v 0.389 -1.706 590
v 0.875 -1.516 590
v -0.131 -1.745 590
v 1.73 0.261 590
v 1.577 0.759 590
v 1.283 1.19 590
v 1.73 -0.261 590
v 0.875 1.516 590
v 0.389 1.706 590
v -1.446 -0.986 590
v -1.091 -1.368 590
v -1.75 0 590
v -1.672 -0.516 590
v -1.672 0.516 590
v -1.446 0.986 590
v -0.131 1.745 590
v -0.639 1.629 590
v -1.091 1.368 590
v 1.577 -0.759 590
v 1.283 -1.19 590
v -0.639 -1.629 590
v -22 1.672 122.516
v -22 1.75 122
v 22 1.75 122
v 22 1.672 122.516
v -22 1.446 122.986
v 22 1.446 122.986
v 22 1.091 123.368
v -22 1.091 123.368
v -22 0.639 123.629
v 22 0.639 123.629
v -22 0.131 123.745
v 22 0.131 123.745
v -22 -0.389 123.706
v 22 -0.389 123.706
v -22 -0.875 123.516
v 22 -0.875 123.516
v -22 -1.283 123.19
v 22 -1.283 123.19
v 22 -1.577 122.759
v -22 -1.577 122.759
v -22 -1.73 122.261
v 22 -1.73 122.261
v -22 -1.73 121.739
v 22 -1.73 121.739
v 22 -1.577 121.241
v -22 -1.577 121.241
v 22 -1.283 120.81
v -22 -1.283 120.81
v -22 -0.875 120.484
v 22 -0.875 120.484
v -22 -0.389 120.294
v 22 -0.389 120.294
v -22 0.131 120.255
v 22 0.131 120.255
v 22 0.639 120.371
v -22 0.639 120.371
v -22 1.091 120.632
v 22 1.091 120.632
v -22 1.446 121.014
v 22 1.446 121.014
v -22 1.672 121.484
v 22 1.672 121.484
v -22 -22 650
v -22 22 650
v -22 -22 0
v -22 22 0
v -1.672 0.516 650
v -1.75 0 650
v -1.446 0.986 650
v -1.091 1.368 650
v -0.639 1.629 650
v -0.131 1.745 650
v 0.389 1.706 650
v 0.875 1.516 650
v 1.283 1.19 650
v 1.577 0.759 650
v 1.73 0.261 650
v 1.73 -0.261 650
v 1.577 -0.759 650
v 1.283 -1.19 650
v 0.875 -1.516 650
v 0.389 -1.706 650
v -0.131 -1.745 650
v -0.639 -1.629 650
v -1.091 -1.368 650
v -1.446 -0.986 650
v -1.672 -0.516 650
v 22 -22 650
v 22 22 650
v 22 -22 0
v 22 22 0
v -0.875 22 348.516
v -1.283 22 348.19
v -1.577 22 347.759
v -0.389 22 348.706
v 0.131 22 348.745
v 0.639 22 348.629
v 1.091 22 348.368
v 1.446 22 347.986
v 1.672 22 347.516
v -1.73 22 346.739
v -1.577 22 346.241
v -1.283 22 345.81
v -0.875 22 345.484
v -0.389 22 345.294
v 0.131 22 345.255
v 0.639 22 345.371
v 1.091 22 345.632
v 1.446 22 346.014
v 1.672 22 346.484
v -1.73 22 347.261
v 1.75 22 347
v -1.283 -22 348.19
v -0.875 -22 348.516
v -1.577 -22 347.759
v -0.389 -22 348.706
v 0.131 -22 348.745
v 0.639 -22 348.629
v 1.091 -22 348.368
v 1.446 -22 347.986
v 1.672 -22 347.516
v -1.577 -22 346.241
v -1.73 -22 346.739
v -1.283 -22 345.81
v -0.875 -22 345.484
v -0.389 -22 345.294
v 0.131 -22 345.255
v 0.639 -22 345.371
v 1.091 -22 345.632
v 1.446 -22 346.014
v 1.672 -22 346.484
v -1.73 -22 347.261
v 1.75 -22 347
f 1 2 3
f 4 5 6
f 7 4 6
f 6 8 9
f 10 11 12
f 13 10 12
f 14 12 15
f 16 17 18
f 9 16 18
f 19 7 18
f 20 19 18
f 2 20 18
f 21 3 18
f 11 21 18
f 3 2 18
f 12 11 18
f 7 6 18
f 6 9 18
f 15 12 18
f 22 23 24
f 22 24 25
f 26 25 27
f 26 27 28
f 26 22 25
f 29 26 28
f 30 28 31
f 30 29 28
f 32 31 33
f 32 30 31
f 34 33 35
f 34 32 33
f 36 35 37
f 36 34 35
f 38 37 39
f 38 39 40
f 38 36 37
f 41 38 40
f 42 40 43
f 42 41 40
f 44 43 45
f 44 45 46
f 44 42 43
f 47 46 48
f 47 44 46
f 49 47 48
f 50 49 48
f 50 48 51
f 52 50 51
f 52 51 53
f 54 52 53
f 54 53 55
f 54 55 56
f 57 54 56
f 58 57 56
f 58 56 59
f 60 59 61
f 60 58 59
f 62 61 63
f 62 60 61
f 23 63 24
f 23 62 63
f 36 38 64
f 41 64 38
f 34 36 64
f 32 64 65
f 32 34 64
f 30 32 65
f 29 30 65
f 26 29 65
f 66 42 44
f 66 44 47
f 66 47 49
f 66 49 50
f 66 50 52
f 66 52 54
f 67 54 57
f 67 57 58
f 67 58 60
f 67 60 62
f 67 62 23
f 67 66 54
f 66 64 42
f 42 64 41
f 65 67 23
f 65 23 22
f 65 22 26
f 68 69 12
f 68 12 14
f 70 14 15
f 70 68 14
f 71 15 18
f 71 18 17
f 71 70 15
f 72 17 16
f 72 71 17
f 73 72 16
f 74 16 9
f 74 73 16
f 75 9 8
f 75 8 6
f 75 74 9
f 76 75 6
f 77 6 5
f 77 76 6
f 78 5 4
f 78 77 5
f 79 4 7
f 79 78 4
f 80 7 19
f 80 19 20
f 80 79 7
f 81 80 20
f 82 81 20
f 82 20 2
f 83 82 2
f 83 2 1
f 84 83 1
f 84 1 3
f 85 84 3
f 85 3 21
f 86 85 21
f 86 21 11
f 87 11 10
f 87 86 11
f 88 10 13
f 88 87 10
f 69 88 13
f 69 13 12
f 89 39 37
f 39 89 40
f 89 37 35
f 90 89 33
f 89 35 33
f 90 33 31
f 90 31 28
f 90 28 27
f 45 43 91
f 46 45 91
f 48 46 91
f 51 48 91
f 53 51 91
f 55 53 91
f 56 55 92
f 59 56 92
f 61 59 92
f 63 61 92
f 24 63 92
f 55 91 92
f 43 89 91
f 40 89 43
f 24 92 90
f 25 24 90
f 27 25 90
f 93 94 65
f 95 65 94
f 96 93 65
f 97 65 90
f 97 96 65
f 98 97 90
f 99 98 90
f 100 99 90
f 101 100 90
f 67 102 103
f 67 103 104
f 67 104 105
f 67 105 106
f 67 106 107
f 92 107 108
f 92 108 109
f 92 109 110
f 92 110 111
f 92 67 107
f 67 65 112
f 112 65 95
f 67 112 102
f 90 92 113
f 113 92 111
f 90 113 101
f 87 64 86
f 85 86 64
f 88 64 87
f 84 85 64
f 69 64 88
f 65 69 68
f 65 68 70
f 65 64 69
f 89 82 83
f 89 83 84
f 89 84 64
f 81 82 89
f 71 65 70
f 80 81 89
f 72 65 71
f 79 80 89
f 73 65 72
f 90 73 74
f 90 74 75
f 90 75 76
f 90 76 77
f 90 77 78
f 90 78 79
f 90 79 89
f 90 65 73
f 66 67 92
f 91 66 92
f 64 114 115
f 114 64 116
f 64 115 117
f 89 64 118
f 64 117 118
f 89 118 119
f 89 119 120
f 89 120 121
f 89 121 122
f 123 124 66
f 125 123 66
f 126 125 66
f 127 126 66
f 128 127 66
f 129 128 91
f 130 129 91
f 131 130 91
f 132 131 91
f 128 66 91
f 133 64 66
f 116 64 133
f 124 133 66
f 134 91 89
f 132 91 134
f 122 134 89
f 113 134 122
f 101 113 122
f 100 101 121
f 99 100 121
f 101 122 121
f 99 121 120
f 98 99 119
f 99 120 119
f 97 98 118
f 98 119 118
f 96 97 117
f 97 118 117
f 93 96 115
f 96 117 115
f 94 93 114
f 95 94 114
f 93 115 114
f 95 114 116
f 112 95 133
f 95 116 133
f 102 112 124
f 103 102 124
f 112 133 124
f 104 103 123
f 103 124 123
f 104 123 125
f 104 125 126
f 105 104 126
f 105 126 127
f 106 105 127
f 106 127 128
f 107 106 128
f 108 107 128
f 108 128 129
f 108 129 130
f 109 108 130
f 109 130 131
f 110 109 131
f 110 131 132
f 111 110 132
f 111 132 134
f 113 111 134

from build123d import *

# Parameters (mm, degrees)
ESQUISSE1_W             = 44
ESQUISSE1_H             = 44
BOSS_EXTRU_1_DEPTH      = 650
ESQUISSE2_R             = 1.75
ENL_V_MAT_EXTRU_1_DEPTH = 60
ESQUISSE3_R             = 1.75
ENL_V_MAT_EXTRU_2_DEPTH = 44
ESQUISSE4_R             = 1.75
ENL_V_MAT_EXTRU_3_DEPTH = 60


with BuildPart() as part:
    # Esquisse1 → Boss.-Extru.1 (new body)
    with BuildSketch(Plane.XY):
        Rectangle(ESQUISSE1_W, ESQUISSE1_H)
    extrude(amount=BOSS_EXTRU_1_DEPTH)

    # Esquisse2 → Enlèv. mat.-Extru.1 (cut)
    with BuildSketch(Plane(origin=(0, 0, 650), x_dir=(-1, 0, 0), z_dir=(0, 0, -1))):
        Circle(ESQUISSE2_R)
    extrude(amount=ENL_V_MAT_EXTRU_1_DEPTH, mode=Mode.SUBTRACT)

    # Esquisse3 → Enlèv. mat.-Extru.2 (cut)
    with BuildSketch(Plane.YZ.offset(-22)):
        with Locations((0, 122)):
            Circle(ESQUISSE3_R)
    extrude(amount=ENL_V_MAT_EXTRU_2_DEPTH, mode=Mode.SUBTRACT)

    # Esquisse4 → Enlèv. mat.-Extru.3 (cut)
    with BuildSketch(Plane.XZ.offset(22)):
        with Locations((0, 347)):
            Circle(ESQUISSE4_R)
    extrude(amount=-ENL_V_MAT_EXTRU_3_DEPTH, mode=Mode.SUBTRACT)


solid = part.part
